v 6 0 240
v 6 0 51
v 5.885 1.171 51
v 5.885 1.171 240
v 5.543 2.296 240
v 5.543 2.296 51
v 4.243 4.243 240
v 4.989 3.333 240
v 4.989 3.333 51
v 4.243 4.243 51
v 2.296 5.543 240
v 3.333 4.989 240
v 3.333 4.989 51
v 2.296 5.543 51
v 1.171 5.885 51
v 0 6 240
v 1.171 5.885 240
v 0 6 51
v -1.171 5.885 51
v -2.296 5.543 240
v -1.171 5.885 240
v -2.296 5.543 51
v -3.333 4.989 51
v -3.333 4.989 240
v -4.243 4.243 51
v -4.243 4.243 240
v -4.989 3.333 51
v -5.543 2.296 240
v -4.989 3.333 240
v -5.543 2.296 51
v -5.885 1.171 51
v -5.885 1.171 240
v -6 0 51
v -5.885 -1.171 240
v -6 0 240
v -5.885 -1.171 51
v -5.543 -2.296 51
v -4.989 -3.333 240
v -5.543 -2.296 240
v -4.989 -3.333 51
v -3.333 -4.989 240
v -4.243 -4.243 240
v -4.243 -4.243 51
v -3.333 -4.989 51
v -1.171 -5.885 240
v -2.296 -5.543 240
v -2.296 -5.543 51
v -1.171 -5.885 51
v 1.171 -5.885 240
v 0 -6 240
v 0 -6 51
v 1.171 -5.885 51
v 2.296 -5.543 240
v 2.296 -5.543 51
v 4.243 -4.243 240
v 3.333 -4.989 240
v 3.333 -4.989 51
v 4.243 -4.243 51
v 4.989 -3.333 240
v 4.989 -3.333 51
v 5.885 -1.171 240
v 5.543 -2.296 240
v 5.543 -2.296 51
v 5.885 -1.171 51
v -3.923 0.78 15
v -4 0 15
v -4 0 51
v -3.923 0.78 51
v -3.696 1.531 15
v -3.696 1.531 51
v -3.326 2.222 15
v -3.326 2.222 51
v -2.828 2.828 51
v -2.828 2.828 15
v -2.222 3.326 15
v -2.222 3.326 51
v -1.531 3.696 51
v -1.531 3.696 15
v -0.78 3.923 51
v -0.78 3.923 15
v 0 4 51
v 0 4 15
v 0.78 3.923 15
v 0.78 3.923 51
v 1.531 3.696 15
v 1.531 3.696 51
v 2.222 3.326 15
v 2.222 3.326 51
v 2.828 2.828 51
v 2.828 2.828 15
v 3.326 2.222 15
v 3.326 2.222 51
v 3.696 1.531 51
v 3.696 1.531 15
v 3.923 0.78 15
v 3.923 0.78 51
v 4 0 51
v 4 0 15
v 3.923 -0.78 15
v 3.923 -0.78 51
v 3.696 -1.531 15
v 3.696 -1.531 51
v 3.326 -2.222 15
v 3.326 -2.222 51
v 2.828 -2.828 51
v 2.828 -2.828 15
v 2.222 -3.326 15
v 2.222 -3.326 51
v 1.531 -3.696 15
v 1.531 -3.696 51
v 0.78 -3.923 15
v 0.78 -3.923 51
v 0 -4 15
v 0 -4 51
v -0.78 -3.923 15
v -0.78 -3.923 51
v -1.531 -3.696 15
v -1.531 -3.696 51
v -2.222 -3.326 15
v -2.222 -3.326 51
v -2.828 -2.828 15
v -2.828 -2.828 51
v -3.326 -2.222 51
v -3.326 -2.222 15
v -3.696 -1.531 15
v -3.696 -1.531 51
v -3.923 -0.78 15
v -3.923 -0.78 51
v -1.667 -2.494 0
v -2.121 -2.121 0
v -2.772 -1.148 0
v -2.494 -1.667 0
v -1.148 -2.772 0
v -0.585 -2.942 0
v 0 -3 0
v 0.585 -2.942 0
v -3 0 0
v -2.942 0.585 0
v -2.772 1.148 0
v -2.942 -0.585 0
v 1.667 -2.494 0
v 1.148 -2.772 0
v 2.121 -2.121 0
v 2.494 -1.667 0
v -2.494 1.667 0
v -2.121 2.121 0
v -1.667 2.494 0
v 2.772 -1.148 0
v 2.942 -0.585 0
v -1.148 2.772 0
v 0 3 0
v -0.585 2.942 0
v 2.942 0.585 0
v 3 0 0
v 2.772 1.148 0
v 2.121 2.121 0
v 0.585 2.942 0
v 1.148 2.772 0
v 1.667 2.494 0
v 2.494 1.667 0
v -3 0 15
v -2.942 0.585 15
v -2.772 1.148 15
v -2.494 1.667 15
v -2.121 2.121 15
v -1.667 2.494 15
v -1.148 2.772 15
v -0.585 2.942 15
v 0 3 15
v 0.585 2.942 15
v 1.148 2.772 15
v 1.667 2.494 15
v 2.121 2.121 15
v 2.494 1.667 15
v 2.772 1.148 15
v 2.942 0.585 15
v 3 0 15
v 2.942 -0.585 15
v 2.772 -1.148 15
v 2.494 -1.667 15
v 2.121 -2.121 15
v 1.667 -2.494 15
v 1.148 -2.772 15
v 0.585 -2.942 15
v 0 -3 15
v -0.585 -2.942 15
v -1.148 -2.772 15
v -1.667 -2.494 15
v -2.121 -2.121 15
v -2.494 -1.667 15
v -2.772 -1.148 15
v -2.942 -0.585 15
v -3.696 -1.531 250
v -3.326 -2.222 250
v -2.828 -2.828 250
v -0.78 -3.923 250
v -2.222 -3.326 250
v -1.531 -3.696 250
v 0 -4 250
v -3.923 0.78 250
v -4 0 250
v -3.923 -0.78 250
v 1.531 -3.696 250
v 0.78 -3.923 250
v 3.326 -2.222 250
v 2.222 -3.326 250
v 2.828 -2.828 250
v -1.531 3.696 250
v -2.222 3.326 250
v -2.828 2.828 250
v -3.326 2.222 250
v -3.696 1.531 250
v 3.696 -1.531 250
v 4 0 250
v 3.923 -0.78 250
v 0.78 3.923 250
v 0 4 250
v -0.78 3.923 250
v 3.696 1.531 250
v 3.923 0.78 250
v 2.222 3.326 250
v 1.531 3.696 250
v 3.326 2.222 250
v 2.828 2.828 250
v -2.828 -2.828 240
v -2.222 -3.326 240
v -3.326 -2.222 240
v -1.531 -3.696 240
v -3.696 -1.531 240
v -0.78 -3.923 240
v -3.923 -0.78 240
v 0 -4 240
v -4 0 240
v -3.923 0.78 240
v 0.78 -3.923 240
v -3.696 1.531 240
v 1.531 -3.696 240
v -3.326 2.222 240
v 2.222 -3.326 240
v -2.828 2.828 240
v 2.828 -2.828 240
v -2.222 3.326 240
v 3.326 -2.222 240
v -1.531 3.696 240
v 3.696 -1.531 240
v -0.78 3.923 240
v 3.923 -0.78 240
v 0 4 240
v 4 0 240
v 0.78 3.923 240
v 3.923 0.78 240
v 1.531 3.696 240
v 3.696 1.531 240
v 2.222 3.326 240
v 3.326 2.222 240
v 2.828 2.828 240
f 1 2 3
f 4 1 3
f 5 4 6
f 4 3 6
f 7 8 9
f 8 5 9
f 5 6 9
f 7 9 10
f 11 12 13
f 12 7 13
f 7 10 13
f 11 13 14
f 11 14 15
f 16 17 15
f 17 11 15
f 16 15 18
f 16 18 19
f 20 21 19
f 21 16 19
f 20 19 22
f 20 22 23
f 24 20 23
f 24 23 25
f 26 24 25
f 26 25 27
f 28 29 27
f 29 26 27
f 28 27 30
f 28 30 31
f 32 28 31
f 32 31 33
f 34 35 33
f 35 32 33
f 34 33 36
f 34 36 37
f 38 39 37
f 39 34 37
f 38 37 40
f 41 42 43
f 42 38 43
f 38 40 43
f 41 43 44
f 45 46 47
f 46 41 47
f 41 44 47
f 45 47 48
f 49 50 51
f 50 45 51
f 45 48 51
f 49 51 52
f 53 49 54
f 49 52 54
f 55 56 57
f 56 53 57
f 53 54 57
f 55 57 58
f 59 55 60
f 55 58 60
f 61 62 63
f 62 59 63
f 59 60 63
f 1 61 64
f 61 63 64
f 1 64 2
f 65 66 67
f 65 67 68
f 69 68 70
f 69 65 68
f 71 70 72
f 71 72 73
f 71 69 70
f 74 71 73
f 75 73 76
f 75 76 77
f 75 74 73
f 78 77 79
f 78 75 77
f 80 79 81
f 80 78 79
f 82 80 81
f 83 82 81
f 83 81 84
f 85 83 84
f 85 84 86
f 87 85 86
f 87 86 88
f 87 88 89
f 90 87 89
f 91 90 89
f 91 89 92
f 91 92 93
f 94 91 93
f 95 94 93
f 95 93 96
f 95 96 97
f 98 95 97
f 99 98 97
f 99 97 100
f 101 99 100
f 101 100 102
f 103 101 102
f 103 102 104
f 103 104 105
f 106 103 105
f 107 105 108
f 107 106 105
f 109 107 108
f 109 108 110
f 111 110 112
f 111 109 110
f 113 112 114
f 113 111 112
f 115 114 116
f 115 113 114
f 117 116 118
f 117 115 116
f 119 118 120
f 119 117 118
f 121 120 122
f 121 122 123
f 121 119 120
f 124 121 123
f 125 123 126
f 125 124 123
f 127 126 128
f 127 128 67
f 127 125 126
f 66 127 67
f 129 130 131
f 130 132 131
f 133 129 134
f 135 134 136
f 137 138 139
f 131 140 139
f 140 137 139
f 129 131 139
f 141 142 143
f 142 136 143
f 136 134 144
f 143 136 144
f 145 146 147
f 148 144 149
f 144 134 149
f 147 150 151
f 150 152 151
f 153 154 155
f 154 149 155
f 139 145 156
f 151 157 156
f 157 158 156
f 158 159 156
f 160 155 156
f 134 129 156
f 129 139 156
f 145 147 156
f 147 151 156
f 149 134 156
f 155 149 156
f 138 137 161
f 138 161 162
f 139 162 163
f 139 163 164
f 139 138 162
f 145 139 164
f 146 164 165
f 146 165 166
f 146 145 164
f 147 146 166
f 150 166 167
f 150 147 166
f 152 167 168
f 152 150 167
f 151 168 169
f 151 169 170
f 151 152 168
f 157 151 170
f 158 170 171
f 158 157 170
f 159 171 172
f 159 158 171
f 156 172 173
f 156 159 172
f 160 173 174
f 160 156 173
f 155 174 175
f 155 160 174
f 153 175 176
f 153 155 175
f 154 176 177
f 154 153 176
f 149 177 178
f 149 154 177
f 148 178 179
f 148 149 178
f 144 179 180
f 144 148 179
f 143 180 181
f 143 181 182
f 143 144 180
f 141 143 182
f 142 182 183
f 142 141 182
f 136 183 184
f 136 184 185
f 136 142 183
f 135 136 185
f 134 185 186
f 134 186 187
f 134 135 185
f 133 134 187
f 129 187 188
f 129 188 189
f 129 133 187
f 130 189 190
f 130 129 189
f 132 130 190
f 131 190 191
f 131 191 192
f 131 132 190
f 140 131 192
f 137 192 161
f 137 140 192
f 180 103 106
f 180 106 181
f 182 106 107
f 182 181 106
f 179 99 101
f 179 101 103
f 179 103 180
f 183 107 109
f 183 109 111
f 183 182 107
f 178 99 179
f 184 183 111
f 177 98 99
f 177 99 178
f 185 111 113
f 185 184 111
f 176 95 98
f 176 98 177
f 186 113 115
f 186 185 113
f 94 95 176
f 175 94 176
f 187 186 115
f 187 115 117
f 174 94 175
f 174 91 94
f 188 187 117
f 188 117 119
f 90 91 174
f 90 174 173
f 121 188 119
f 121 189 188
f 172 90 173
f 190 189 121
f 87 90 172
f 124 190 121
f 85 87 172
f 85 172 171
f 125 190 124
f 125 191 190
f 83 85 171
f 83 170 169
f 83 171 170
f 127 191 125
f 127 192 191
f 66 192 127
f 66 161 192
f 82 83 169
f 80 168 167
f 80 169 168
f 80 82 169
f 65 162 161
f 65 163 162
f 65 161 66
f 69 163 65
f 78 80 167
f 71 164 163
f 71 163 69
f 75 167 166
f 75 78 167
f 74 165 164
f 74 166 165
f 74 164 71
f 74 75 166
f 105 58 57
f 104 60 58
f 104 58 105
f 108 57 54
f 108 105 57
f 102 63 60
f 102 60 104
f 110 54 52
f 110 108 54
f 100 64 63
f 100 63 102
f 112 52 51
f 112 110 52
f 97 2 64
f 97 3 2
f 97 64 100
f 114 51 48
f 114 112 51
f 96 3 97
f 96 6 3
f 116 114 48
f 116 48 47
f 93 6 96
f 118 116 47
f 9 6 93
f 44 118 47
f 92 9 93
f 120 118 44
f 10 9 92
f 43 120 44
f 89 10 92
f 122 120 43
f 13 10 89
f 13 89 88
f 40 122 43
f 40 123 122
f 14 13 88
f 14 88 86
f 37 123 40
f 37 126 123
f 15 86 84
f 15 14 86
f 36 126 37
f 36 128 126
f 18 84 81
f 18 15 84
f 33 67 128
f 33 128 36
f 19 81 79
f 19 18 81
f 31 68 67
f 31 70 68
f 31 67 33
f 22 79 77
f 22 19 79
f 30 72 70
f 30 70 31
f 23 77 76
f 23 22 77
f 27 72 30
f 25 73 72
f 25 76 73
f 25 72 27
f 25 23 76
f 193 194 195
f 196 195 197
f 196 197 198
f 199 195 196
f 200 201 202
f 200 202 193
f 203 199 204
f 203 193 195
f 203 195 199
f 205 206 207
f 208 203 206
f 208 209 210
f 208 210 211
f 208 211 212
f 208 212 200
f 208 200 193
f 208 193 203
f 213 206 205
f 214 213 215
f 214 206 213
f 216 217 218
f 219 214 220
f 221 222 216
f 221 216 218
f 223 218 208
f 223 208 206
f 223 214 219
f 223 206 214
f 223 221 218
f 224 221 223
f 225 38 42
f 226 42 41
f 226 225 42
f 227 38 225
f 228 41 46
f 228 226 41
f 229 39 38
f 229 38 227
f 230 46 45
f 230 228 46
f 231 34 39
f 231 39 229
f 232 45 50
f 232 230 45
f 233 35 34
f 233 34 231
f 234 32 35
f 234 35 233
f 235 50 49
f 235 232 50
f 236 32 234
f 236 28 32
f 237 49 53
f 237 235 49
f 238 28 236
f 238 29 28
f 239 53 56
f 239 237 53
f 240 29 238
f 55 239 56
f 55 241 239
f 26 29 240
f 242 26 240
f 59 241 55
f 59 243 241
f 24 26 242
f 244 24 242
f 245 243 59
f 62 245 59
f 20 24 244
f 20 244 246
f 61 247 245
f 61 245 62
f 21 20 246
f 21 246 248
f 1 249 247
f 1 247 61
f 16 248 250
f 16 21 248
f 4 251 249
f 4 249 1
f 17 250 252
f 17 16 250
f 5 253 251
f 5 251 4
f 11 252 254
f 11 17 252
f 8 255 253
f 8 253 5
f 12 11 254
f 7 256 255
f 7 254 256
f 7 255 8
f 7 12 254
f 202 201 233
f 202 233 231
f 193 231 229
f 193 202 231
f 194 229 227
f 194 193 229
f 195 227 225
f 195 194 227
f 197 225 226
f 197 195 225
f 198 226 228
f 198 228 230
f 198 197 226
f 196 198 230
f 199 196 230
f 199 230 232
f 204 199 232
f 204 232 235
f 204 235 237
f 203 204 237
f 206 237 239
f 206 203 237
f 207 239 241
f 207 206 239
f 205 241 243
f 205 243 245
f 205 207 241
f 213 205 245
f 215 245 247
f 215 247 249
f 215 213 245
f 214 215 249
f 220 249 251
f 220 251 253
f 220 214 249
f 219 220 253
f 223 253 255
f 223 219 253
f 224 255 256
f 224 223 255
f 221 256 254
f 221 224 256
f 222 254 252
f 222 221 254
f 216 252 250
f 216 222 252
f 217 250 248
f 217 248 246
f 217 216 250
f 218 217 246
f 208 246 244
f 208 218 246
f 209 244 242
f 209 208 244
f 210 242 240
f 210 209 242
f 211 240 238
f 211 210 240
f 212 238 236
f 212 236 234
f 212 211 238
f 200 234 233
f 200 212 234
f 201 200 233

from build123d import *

# Parameters (mm, degrees)
SKETCH1_R           = 6
BOSS_EXTRUDE1_DEPTH = 250
SKETCH2_OUTSIDE_W   = 64.116
SKETCH2_OUTSIDE_H   = 64.116
SKETCH2_OUTSIDE_R   = 3
F_6MM_DEPTH         = 15
SKETCH3_OUTSIDE_W   = 64.116
SKETCH3_OUTSIDE_H   = 64.116
SKETCH3_OUTSIDE_R   = 4
F_8MM_DEPTH         = 51
SKETCH4_OUTSIDE_W   = 64.116
SKETCH4_OUTSIDE_H   = 64.116
SKETCH4_OUTSIDE_R   = 4
F_8MM_IDLE_DEPTH    = 10


with BuildPart() as part:
    # Sketch1 → Boss-Extrude1 (new body)
    with BuildSketch(Plane.XY):
        Circle(SKETCH1_R)
    extrude(amount=BOSS_EXTRUDE1_DEPTH)

    # Sketch2 outside → 6mm (cut)
    with BuildSketch(Plane(origin=(0, 0, 0), x_dir=(-1, 0, 0), z_dir=(0, 0, -1))):
        Rectangle(SKETCH2_OUTSIDE_W, SKETCH2_OUTSIDE_H)
        Circle(SKETCH2_OUTSIDE_R, mode=Mode.SUBTRACT)
    extrude(amount=-F_6MM_DEPTH, mode=Mode.SUBTRACT)

    # Sketch3 outside → 8mm (cut)
    with BuildSketch(Plane(origin=(0, 0, 0), x_dir=(-1, 0, 0), z_dir=(0, 0, -1))):
        Rectangle(SKETCH3_OUTSIDE_W, SKETCH3_OUTSIDE_H)
        Circle(SKETCH3_OUTSIDE_R, mode=Mode.SUBTRACT)
    extrude(amount=-F_8MM_DEPTH, mode=Mode.SUBTRACT)

    # Sketch4 outside → 8mm-Idle (cut)
    with BuildSketch(Plane.XY.offset(250)):
        Rectangle(SKETCH4_OUTSIDE_W, SKETCH4_OUTSIDE_H)
        with Locations(Location((0, 0, 0), (0, 0, 180))):
            Circle(SKETCH4_OUTSIDE_R, mode=Mode.SUBTRACT)
    extrude(amount=-F_8MM_IDLE_DEPTH, mode=Mode.SUBTRACT)


solid = part.part
